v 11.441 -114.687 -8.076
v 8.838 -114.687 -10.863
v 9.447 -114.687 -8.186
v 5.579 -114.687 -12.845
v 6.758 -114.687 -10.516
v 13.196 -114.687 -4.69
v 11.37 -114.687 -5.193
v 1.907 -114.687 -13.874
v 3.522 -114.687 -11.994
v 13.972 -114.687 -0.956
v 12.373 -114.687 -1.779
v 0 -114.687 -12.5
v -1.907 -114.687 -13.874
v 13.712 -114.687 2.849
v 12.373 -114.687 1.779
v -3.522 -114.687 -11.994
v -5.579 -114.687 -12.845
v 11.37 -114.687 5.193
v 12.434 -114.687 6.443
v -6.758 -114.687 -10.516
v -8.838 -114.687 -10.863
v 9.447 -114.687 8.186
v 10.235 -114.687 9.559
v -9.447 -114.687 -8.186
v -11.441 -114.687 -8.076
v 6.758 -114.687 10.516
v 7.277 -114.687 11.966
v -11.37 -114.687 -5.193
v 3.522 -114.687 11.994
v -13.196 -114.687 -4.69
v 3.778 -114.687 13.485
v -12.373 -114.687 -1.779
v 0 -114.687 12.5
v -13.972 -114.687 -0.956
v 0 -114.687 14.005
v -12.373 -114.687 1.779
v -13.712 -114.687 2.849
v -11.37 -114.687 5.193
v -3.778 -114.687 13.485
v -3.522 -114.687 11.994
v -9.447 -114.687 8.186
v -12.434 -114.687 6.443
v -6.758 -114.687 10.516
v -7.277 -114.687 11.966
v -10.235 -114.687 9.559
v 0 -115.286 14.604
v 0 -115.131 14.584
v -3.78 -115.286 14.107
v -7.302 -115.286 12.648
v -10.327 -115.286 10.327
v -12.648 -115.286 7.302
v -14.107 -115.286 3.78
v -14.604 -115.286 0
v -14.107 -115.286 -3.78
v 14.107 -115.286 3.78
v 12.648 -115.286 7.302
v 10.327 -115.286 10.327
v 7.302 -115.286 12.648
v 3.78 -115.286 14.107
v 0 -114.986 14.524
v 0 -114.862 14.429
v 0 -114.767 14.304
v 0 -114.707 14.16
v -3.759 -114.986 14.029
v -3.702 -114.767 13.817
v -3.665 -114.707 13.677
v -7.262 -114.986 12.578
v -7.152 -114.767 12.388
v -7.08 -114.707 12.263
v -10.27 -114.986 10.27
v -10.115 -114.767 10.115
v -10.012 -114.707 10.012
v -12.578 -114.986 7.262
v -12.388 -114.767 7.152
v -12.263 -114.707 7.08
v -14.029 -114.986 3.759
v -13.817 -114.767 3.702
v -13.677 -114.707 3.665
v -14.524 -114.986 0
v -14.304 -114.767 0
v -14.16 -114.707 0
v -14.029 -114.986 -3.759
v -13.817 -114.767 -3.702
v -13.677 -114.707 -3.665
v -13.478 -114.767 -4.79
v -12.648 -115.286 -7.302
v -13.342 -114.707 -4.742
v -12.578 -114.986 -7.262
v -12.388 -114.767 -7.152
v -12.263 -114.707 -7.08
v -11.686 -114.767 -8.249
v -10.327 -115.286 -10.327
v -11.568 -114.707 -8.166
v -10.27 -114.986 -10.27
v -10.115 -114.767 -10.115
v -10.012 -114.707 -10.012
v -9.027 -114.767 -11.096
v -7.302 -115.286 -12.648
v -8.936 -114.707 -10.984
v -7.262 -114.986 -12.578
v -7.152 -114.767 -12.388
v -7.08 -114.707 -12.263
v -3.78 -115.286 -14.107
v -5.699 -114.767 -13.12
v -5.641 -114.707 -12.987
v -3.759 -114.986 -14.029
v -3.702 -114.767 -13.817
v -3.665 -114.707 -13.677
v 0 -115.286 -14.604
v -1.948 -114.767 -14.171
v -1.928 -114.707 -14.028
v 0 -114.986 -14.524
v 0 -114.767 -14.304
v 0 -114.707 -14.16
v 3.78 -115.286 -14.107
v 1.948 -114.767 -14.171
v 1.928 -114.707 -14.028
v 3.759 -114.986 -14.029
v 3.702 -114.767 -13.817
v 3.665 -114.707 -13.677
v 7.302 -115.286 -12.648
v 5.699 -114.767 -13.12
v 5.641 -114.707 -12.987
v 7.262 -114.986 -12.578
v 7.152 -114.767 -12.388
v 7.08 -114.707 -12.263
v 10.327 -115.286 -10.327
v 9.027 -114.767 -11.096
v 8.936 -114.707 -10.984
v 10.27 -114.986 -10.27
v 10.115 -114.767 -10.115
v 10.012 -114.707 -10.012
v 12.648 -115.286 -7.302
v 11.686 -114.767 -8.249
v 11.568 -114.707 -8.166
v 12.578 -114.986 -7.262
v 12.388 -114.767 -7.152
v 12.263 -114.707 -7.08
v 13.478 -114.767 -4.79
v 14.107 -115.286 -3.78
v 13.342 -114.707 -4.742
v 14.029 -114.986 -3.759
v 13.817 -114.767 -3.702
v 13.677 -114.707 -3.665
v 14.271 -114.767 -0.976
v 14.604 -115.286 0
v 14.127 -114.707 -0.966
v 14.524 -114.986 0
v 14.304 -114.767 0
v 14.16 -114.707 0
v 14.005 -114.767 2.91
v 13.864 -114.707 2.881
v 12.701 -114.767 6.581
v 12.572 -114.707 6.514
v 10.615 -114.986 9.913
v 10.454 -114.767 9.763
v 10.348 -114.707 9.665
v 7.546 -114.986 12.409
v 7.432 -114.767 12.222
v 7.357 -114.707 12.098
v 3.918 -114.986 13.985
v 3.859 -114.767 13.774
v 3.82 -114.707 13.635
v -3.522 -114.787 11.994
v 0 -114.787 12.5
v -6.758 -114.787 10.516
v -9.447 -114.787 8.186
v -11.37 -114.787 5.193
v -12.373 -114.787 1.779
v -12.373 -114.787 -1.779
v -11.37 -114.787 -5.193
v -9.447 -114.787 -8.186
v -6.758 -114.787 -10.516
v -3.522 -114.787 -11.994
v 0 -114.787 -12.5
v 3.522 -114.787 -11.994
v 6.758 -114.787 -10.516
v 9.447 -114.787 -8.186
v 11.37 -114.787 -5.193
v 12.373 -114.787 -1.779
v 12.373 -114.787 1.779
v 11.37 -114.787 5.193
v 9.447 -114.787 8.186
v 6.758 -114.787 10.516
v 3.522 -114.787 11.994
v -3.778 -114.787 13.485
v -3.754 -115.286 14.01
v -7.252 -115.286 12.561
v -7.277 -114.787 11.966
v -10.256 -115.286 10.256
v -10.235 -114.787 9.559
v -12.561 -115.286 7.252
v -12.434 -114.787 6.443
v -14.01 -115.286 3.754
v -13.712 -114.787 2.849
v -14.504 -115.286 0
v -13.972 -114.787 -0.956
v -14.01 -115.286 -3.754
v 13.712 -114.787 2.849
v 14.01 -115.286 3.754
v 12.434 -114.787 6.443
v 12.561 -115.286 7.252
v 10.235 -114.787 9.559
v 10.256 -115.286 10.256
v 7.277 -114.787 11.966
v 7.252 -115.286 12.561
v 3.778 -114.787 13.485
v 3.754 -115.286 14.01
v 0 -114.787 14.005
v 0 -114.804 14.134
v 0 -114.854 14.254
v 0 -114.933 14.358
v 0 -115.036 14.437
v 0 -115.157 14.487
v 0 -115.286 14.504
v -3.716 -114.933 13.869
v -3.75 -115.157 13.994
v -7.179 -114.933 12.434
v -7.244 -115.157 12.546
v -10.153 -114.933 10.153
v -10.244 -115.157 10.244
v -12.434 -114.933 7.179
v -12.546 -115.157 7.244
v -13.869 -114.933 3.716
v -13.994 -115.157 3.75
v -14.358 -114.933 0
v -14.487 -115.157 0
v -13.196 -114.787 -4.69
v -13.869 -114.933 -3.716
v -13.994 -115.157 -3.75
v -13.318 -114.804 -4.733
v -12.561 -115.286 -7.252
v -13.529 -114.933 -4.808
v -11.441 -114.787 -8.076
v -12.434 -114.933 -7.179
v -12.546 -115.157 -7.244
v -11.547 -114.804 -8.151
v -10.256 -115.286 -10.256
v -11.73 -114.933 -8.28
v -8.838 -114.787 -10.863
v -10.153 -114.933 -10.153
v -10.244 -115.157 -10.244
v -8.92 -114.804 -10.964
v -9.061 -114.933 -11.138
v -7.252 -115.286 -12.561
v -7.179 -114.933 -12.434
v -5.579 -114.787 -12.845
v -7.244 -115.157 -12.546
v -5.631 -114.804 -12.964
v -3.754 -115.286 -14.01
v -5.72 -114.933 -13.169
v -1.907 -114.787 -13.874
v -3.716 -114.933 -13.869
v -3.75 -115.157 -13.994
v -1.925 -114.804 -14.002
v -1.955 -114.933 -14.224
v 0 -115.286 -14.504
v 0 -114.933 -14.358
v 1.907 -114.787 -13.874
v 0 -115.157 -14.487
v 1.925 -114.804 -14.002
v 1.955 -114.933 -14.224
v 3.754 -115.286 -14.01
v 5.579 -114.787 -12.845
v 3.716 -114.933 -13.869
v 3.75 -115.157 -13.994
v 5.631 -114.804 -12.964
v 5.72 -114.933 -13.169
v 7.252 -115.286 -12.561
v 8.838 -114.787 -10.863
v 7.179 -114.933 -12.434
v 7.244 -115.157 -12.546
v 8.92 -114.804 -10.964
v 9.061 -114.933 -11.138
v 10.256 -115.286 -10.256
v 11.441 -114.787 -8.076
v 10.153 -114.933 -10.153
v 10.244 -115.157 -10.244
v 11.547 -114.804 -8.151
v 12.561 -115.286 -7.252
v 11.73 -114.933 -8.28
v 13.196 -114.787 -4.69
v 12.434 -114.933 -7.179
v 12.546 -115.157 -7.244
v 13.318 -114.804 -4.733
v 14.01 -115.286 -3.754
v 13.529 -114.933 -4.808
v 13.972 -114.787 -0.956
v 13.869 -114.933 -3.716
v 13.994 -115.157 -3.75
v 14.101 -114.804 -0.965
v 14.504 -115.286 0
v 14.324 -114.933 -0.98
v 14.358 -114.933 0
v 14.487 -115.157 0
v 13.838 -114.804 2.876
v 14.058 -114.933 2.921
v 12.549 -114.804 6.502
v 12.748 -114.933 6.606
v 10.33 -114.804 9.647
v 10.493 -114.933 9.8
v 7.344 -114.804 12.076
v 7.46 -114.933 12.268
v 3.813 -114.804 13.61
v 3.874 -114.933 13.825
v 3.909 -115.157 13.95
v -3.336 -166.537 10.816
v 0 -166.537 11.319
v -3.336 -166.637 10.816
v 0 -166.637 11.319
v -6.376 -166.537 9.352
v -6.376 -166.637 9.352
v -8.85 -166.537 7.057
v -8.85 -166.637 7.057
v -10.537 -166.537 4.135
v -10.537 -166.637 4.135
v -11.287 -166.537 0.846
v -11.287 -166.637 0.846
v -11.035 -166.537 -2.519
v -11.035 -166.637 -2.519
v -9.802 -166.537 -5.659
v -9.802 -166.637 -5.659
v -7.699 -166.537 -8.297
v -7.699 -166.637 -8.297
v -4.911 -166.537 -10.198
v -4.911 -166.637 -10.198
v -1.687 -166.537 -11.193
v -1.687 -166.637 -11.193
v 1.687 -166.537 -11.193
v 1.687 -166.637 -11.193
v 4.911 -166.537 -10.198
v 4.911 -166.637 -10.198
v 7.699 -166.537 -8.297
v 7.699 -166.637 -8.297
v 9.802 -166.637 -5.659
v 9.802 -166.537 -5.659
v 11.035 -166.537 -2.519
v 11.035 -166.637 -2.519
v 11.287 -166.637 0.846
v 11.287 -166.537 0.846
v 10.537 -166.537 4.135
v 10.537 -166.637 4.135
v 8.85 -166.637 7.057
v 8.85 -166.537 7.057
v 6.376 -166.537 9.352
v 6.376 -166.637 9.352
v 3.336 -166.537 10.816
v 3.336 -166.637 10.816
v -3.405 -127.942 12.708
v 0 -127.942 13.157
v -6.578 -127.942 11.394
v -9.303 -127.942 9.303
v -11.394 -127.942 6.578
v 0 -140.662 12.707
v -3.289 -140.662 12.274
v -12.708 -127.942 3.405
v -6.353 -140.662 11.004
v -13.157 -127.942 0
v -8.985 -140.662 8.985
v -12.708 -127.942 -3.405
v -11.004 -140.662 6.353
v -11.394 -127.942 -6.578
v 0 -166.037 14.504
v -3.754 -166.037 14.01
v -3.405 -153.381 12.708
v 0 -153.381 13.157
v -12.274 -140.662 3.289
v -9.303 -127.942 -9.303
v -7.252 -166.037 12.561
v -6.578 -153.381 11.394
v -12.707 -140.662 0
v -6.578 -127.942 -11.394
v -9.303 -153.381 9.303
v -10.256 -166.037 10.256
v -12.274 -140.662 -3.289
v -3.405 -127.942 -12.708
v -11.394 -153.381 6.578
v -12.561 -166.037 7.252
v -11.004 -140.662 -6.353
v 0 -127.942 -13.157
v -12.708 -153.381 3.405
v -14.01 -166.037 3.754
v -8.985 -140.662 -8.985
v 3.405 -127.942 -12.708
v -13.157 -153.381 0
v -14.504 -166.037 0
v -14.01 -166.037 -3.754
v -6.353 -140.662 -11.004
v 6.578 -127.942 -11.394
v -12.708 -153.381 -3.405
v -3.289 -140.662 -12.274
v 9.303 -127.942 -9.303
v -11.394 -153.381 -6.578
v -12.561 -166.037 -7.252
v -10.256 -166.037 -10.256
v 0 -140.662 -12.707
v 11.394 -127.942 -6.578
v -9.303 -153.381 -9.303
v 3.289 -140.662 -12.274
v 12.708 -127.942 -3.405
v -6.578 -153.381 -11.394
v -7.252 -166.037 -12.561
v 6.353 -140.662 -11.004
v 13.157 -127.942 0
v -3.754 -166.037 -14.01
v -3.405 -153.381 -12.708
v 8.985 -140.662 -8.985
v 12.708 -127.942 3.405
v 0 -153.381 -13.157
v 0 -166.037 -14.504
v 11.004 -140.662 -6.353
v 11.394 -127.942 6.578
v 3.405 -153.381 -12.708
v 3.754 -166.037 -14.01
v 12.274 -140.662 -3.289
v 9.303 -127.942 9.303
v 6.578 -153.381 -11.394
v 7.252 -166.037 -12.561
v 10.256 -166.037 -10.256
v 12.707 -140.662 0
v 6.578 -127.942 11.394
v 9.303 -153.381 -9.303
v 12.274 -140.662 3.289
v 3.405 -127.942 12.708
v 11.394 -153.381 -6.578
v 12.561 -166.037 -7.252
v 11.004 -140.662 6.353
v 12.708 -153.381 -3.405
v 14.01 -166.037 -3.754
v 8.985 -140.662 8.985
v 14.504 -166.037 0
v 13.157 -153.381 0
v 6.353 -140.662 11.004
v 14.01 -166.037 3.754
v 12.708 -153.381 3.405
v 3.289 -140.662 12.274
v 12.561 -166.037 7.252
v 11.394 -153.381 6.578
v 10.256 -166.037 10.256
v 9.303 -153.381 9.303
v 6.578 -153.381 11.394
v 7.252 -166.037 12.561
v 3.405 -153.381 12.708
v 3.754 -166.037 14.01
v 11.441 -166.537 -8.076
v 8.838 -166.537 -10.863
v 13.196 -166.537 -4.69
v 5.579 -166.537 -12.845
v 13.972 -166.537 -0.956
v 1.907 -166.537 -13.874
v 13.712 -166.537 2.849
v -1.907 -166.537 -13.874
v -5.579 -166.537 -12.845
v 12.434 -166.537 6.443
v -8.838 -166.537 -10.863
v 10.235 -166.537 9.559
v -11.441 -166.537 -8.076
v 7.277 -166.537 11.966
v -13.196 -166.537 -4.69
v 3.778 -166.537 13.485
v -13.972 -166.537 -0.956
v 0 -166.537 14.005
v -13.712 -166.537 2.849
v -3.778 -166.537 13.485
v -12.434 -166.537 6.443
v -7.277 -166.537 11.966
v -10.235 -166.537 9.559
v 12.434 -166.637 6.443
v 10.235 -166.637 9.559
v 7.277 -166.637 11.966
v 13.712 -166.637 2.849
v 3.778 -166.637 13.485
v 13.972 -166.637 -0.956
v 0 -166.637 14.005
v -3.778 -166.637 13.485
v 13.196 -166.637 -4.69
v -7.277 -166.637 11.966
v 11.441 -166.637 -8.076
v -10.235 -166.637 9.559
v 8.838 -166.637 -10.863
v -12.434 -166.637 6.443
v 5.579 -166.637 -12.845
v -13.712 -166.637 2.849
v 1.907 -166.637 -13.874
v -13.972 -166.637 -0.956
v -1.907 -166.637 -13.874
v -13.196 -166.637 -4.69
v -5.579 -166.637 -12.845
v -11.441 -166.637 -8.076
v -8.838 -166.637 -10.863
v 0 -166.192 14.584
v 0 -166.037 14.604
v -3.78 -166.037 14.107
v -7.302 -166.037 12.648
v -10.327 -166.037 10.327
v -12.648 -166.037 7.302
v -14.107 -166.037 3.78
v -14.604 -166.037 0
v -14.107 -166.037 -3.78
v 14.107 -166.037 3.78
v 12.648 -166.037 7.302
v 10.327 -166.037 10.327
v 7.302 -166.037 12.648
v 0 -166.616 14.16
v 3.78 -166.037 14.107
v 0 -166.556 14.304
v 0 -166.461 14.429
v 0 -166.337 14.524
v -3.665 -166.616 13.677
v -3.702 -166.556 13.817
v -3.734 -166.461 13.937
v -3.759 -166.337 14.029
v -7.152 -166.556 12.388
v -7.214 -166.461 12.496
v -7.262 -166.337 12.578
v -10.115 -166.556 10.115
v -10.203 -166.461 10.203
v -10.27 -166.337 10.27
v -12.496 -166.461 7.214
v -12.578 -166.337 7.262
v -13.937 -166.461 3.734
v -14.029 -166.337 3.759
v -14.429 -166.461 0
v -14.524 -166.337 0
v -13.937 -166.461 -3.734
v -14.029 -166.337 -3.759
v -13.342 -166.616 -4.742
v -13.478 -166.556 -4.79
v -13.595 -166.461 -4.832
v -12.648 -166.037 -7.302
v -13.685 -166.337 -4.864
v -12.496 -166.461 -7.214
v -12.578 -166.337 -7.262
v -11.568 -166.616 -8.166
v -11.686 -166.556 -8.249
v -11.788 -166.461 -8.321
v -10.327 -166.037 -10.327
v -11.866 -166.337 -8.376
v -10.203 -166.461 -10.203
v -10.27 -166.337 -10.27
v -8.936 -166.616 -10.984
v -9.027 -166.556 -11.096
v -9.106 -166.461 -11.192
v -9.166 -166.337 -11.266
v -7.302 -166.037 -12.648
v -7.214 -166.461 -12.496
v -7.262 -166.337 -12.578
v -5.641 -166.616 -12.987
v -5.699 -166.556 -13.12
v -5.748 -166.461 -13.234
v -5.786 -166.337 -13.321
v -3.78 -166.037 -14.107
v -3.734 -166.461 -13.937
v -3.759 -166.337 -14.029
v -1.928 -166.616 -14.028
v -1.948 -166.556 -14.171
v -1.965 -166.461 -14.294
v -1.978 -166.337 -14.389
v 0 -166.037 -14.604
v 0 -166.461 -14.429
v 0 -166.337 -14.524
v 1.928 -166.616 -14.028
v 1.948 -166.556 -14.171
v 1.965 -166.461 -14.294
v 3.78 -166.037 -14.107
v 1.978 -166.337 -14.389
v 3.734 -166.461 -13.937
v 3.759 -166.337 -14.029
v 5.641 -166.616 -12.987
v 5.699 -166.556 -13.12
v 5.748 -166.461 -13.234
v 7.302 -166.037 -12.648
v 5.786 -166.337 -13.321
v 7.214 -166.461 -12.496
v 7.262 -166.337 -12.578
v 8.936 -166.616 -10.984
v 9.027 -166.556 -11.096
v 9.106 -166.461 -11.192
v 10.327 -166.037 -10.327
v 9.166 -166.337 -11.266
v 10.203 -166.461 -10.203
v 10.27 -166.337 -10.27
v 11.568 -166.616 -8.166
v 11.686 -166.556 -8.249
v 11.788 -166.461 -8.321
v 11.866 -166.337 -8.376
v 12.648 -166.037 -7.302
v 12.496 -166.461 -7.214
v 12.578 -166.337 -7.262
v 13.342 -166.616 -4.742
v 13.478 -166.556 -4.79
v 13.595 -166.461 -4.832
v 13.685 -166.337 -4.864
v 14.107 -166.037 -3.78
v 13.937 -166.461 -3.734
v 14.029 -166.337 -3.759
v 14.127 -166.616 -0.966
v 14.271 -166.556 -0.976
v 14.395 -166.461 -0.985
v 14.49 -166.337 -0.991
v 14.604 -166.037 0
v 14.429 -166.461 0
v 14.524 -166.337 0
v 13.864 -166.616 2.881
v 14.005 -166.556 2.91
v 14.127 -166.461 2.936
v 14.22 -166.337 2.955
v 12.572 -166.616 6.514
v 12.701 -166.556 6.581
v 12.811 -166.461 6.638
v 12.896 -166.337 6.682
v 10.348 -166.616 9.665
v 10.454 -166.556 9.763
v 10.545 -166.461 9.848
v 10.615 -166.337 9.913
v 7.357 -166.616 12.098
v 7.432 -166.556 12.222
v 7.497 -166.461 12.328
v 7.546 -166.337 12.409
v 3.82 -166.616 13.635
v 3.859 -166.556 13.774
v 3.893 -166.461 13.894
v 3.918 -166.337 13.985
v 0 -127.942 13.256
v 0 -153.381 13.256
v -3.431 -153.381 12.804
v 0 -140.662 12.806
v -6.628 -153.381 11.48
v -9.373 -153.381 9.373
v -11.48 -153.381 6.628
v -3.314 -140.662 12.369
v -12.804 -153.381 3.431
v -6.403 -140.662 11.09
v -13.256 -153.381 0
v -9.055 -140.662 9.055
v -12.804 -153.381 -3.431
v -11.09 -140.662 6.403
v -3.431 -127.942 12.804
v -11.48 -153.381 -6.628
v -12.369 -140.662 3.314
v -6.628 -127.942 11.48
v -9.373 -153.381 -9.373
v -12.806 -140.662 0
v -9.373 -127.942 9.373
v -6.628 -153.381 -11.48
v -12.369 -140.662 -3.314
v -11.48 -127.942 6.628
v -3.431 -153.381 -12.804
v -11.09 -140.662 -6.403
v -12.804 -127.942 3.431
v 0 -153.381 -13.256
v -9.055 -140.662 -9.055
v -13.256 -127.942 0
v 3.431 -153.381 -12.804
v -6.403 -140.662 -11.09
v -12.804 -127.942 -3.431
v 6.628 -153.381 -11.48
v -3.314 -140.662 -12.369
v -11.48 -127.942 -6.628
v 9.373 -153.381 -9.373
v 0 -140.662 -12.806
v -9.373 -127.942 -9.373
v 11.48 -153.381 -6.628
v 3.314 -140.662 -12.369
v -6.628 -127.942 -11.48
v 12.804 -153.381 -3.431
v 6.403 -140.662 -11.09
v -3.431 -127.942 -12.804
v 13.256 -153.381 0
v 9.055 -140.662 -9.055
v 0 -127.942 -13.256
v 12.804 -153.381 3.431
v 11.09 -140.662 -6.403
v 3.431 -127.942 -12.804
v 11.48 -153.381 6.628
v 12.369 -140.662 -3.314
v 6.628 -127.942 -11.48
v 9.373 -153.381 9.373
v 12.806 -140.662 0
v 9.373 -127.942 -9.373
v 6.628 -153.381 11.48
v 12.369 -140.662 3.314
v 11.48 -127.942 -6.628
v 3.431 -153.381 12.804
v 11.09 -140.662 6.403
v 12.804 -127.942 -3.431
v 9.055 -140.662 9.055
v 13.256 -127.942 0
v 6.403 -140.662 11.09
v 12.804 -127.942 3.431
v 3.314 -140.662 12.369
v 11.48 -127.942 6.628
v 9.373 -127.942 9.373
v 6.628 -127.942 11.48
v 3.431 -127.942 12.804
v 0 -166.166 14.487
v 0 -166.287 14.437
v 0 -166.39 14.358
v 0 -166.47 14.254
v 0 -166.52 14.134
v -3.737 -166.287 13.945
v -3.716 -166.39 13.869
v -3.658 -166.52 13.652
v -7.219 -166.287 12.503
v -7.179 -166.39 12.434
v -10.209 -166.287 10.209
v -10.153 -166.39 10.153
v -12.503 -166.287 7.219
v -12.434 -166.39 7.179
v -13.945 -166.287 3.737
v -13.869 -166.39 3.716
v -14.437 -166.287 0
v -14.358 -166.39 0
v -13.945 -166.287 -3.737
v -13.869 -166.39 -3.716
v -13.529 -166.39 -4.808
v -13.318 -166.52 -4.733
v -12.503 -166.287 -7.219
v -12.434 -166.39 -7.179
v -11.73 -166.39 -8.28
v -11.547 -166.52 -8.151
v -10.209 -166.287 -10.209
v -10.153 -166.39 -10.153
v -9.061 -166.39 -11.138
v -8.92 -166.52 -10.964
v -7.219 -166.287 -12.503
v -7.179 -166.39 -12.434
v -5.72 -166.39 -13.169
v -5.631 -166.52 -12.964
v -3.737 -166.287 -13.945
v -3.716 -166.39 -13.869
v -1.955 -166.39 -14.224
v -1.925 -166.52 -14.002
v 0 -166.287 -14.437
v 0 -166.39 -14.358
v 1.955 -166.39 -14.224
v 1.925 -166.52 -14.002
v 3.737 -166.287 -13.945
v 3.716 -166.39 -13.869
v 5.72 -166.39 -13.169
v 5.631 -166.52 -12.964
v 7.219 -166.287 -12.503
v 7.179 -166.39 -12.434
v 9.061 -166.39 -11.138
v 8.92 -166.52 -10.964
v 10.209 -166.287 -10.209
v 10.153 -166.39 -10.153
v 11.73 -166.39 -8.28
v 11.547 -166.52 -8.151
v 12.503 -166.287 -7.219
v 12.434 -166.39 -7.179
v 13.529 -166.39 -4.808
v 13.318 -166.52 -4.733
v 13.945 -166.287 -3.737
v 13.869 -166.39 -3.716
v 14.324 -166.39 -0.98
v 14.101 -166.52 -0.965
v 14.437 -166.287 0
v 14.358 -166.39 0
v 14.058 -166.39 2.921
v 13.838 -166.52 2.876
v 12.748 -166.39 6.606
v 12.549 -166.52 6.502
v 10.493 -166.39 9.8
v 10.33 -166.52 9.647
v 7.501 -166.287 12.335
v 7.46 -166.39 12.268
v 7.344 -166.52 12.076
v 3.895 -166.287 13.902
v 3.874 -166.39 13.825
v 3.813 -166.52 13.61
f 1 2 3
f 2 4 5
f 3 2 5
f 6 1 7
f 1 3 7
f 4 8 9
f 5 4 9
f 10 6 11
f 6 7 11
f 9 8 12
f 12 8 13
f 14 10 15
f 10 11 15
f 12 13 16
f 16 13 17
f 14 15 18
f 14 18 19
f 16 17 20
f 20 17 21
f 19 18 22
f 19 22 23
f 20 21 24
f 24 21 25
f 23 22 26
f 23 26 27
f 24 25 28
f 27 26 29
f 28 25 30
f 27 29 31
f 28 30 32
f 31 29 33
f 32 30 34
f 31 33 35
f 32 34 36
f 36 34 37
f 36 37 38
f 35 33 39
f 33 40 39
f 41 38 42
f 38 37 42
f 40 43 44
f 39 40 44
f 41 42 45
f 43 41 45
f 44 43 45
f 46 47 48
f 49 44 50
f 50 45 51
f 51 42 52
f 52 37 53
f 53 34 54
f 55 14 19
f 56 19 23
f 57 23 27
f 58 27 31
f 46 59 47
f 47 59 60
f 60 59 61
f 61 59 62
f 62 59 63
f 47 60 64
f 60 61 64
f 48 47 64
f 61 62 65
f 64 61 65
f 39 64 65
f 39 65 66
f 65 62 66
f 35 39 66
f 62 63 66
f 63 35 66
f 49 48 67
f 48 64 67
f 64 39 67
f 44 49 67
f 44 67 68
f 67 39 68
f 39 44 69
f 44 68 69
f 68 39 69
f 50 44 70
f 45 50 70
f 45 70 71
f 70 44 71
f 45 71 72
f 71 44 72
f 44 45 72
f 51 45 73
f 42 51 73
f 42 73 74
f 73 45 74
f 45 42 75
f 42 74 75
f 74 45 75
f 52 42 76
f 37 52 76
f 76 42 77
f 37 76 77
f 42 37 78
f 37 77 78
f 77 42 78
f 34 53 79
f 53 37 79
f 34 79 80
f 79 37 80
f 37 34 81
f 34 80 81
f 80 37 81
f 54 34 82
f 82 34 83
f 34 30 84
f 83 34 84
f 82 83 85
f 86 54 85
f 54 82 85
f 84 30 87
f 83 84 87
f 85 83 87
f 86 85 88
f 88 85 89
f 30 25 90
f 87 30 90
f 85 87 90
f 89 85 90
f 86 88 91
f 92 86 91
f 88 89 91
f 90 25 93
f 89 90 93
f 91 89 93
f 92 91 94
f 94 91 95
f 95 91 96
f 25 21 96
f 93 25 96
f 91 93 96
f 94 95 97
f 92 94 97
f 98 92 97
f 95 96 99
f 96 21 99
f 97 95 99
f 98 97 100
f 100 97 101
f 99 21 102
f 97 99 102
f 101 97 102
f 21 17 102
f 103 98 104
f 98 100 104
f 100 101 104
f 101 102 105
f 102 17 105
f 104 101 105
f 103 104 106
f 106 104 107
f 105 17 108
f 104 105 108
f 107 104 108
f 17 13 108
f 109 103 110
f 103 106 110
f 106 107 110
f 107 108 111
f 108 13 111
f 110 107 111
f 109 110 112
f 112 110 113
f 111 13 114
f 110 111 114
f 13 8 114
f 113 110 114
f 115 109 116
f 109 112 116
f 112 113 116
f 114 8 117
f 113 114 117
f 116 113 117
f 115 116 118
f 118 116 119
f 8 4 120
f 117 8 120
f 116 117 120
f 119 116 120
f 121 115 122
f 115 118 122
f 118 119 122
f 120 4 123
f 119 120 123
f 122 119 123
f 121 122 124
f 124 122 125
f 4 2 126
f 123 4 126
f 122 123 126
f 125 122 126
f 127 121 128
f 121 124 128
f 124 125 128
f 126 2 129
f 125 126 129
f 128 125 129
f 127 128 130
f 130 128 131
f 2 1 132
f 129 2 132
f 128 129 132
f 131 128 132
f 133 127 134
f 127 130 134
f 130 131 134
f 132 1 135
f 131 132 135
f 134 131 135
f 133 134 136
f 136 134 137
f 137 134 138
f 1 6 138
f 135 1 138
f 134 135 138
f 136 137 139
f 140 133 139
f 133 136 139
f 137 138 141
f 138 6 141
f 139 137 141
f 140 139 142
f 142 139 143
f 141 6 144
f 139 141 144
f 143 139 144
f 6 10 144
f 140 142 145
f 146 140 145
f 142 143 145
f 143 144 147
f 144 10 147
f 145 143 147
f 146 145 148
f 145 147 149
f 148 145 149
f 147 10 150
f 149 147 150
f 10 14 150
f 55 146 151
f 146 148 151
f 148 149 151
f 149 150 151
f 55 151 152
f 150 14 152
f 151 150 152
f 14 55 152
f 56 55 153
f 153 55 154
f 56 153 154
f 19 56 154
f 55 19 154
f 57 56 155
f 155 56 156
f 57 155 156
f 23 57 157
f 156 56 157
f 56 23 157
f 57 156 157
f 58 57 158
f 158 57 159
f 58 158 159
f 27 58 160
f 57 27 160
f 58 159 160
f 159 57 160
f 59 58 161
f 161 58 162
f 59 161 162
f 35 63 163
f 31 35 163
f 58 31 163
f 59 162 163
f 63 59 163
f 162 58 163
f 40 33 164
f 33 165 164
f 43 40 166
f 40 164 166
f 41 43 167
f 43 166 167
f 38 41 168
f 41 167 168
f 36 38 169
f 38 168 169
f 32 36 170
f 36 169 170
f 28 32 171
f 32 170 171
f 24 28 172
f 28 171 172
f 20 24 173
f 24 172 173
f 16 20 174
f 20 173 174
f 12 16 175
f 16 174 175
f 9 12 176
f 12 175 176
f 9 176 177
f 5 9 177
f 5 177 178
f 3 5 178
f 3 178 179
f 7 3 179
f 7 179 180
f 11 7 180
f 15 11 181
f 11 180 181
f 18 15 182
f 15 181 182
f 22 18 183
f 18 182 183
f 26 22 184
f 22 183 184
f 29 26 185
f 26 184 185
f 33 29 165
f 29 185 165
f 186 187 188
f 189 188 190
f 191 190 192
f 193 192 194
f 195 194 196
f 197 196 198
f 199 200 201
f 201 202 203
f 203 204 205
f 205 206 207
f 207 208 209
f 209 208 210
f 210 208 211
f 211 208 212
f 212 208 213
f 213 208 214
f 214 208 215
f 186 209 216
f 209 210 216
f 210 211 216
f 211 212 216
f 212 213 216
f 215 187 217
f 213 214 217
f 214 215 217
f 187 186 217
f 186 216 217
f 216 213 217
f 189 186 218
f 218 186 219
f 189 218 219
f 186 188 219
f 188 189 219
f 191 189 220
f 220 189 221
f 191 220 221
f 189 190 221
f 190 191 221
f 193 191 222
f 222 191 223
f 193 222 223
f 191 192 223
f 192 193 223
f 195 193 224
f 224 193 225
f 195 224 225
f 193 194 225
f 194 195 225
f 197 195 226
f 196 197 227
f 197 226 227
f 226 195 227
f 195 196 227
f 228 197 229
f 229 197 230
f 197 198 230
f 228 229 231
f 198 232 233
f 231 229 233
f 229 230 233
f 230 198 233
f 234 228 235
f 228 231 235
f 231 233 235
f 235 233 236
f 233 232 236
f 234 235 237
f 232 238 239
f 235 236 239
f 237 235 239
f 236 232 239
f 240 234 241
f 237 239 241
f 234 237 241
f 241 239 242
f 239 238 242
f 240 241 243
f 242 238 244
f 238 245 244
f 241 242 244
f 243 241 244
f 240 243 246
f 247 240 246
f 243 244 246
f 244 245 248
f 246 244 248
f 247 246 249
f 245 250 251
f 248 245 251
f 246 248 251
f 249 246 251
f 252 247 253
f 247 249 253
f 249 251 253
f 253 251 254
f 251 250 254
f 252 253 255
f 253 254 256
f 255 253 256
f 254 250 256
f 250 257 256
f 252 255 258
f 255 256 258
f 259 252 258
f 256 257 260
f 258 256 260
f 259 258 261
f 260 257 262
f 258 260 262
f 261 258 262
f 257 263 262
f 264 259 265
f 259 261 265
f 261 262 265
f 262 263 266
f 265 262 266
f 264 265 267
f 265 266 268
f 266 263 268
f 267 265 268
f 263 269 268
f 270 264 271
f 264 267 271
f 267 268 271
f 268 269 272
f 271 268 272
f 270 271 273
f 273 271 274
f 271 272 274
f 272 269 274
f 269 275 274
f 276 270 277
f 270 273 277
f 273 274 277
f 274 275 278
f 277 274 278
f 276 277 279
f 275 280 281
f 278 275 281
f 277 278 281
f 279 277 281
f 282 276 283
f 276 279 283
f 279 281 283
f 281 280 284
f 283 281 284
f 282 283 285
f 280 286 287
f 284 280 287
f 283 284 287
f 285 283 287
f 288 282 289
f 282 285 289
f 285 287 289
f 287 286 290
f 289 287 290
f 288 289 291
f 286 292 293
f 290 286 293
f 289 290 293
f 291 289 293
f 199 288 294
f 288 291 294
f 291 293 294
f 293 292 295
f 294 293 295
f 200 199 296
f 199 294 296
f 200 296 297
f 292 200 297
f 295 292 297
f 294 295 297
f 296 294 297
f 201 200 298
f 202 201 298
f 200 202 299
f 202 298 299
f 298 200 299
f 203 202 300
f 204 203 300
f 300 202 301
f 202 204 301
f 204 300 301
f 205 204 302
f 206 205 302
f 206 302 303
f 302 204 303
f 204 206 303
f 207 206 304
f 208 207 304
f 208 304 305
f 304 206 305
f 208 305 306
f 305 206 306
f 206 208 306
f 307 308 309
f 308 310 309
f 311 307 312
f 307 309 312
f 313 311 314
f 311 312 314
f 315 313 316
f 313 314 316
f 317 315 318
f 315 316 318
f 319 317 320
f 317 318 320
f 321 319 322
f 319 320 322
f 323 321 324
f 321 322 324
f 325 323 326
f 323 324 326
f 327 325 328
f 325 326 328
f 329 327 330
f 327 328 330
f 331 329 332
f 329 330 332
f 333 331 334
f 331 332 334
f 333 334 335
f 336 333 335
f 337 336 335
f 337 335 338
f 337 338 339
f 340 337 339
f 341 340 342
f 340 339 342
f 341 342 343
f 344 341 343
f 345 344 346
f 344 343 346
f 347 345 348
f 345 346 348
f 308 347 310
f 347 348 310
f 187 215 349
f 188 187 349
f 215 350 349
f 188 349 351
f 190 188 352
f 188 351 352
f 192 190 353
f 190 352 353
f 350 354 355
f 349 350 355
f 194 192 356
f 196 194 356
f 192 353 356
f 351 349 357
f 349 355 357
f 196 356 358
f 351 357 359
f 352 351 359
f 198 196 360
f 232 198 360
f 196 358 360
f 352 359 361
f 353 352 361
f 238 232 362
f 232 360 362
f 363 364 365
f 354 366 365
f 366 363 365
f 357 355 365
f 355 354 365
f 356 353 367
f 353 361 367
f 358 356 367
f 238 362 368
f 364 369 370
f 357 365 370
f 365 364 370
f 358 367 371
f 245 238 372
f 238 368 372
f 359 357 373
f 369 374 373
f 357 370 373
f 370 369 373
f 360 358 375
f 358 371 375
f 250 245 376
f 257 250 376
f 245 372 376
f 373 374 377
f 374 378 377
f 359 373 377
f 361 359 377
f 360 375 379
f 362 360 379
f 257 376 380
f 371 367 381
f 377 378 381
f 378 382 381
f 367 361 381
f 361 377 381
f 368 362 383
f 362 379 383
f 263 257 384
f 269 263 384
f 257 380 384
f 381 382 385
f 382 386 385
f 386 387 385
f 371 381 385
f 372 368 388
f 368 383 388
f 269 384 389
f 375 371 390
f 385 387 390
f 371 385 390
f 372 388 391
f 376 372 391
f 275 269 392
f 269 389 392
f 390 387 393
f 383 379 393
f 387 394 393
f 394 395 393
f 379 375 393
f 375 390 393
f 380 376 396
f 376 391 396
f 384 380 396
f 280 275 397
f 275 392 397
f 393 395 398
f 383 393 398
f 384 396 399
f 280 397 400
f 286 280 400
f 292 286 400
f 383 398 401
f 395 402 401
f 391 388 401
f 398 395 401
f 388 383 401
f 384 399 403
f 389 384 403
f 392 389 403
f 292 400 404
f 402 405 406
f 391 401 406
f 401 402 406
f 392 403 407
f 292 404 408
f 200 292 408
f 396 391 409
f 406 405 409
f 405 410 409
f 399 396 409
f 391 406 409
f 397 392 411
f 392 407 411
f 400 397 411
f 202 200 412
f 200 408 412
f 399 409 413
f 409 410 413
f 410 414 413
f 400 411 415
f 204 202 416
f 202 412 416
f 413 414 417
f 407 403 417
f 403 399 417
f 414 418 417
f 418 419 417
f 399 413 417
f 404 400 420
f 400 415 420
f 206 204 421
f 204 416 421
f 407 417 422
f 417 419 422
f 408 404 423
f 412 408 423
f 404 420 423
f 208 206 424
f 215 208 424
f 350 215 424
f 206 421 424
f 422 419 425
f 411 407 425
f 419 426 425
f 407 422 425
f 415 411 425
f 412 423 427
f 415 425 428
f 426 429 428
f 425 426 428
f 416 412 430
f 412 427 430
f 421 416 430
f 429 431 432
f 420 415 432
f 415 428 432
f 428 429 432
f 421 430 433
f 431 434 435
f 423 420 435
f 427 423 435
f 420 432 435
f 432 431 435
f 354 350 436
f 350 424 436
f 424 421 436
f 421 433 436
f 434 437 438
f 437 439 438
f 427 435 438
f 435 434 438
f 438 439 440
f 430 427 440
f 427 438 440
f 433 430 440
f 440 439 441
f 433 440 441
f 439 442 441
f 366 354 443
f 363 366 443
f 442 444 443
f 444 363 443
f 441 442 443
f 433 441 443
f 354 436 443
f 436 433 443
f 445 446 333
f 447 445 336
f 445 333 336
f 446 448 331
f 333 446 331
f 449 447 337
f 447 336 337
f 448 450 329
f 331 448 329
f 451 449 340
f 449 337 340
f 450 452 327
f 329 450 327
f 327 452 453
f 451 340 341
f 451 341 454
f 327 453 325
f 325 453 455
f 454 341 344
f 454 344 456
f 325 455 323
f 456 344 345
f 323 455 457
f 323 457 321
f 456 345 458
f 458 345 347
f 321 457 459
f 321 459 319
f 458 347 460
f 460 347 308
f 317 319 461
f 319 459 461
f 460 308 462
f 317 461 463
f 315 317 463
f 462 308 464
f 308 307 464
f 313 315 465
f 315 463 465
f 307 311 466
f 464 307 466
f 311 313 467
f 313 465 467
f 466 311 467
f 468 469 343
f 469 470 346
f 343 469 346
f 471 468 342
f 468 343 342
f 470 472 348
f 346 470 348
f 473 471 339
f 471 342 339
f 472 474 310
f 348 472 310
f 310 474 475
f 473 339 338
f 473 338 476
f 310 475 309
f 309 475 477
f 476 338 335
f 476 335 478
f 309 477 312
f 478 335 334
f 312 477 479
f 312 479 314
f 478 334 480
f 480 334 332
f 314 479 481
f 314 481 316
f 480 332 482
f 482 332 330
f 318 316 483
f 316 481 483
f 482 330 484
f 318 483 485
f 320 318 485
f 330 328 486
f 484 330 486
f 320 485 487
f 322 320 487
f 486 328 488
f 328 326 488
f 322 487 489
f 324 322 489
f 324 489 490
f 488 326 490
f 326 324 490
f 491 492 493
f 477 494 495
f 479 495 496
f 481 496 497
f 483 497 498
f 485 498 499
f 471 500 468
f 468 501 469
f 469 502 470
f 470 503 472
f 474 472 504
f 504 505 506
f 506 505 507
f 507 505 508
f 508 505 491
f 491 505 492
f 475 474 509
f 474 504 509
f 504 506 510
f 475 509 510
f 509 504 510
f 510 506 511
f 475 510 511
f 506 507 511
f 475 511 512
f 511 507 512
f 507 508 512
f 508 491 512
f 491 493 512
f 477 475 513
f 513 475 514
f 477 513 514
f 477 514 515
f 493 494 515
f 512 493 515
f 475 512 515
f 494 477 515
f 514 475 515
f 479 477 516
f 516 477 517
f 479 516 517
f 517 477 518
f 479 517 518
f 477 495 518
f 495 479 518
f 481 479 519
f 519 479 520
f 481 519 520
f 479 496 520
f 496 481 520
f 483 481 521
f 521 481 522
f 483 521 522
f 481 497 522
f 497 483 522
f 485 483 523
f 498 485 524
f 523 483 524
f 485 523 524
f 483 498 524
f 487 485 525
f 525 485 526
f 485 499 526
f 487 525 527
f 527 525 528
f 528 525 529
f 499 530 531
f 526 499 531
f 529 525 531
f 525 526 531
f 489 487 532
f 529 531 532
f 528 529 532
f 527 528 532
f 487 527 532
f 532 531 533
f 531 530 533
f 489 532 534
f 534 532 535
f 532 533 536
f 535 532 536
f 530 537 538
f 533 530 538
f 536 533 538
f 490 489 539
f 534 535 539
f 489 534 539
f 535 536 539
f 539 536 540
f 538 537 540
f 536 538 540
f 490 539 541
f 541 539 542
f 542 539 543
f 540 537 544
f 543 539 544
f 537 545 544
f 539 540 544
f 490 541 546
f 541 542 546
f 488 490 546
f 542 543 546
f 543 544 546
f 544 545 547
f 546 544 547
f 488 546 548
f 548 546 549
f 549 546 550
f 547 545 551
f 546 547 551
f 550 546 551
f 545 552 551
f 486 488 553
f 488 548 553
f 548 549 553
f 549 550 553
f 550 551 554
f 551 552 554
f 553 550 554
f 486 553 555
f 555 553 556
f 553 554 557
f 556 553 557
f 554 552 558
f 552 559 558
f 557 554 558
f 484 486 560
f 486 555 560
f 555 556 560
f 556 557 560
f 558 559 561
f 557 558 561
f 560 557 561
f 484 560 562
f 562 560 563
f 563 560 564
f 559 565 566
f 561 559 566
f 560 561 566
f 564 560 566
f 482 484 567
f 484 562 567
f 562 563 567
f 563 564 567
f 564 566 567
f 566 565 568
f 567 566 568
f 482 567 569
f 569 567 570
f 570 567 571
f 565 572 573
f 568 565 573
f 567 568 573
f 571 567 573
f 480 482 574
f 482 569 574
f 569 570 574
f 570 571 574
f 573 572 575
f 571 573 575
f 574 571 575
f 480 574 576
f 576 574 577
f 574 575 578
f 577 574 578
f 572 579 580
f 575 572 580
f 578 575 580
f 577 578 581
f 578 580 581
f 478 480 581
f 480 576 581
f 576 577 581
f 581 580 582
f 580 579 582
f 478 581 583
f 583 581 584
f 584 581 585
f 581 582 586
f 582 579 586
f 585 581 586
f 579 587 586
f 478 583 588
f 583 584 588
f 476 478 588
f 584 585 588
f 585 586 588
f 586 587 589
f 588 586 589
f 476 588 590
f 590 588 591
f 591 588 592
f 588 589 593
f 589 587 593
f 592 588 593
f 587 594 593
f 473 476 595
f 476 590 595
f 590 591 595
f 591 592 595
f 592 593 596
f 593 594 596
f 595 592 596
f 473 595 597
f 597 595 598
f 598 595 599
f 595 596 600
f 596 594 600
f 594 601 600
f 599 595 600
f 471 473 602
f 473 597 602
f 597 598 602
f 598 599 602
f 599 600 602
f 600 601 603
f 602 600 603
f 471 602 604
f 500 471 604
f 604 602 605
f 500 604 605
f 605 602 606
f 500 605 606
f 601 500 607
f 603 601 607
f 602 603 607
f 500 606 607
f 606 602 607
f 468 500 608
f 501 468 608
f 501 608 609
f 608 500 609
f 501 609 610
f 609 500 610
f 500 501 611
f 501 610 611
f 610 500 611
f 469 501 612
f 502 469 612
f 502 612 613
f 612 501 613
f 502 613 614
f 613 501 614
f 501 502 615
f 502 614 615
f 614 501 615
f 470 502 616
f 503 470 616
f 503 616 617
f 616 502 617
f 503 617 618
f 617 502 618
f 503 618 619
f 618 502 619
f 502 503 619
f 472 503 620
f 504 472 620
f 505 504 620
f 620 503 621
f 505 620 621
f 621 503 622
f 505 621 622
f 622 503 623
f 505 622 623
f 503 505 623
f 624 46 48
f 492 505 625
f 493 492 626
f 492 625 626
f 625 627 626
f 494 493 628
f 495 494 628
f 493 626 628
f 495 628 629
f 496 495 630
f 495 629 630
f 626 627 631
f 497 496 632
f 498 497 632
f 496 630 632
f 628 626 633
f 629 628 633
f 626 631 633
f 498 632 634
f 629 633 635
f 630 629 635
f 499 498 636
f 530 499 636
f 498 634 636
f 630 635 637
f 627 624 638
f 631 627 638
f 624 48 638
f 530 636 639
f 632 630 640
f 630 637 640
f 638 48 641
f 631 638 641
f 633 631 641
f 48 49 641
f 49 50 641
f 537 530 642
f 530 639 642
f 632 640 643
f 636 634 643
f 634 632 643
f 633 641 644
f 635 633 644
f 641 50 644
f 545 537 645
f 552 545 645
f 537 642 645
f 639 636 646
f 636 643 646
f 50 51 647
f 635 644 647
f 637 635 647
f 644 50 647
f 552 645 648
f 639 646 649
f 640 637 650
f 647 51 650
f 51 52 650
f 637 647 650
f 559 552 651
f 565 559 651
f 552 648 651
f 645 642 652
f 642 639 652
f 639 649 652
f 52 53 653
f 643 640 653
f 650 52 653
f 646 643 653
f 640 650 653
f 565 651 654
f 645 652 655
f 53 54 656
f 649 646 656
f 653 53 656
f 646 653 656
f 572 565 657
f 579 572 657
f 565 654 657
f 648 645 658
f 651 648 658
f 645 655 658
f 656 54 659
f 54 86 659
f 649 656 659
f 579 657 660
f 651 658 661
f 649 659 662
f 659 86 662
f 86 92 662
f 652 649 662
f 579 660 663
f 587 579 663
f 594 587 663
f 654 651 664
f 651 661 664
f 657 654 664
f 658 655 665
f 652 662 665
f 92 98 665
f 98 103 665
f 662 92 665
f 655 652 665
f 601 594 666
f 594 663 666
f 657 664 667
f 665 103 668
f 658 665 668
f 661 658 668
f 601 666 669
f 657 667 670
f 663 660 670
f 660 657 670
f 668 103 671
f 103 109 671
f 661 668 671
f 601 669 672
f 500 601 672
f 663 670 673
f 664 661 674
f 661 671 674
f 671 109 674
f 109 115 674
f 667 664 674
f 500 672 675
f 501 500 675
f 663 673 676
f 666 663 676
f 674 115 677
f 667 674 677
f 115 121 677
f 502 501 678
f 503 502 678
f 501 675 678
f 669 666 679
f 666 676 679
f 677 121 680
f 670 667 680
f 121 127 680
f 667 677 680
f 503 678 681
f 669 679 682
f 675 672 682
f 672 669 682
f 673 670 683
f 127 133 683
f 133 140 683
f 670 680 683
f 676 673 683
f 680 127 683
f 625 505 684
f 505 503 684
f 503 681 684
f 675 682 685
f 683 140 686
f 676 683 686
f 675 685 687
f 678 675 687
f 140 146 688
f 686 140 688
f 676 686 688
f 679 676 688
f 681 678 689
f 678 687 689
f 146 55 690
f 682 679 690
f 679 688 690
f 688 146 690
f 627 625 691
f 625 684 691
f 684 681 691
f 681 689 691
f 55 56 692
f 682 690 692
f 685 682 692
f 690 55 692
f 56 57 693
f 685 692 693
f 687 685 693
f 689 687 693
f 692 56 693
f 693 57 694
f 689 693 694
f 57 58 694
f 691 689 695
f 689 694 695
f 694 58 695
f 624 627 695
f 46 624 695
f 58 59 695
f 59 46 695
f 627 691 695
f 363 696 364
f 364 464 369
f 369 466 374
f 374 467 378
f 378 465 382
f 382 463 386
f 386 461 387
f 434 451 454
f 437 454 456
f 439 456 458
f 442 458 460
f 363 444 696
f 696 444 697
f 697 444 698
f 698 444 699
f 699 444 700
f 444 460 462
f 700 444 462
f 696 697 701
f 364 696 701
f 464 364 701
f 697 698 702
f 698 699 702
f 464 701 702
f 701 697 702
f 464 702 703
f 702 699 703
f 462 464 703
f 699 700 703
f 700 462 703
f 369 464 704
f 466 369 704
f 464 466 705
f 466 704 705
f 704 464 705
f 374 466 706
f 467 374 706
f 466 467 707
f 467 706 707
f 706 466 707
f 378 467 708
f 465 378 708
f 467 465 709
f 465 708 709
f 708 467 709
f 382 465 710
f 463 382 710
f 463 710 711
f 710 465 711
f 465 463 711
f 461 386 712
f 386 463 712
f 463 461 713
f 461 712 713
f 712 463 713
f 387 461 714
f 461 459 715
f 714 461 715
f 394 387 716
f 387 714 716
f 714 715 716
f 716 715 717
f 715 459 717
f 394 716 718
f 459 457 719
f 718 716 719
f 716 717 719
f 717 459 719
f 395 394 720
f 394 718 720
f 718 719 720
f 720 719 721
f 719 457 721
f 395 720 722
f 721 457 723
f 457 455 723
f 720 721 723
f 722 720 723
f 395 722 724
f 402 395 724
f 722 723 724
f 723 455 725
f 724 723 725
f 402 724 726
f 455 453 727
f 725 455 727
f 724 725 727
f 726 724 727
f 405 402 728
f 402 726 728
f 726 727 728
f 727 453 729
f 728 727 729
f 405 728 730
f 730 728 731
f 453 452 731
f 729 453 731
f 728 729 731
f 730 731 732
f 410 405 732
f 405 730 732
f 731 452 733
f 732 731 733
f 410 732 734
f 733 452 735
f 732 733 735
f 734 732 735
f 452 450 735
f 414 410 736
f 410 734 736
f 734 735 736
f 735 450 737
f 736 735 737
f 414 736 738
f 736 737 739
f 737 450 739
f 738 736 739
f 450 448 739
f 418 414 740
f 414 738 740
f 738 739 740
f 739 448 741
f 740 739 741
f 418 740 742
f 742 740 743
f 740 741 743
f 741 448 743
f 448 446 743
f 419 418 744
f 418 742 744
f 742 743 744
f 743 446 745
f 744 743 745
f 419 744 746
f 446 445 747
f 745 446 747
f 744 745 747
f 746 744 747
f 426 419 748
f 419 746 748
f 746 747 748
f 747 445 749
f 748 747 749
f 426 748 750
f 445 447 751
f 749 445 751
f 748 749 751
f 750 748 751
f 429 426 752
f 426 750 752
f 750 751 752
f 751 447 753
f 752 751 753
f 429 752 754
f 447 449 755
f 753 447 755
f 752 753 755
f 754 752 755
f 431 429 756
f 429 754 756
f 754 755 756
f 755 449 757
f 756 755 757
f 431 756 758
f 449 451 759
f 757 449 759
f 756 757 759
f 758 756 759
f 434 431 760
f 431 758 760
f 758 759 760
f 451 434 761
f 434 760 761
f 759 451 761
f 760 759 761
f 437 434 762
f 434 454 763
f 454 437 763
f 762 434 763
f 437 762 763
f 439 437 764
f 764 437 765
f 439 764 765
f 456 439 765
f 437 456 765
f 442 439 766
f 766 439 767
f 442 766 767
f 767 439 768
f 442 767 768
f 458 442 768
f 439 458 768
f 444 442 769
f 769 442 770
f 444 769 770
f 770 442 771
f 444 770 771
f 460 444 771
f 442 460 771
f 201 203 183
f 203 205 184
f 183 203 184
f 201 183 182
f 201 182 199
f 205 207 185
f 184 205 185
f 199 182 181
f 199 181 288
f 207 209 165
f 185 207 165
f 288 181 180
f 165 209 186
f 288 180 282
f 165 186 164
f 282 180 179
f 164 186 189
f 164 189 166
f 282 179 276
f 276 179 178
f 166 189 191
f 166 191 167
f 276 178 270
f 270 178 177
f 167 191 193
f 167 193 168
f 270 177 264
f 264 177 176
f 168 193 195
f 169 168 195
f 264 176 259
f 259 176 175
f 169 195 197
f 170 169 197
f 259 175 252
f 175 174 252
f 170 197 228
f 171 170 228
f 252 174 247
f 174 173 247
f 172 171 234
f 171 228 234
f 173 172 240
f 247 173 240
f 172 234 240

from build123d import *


with BuildPart() as part:
    # Sketch1 → Revolve1 (revolve)
    with BuildSketch(Plane.XY, mode=Mode.PRIVATE) as revolve1_sk:
        with BuildLine():
            Line((12.5, -114.686619696), (12.5, -114.786619696))
            Line((12.5, -114.786619696), (14.004531695, -114.786619696))
            ThreePointArc((14.004531695, -114.786619696), (14.357864572, -114.932974966), (14.504219842, -115.286307843))
            ThreePointArc((14.504219842, -115.286307843), (12.706614743, -140.661619696), (14.504219842, -166.036931549))
            ThreePointArc((14.504219842, -166.036931549), (14.357864572, -166.390264426), (14.004531695, -166.536619696))
            Line((14.004531695, -166.536619696), (11.318941473, -166.536619696))
            Line((11.318941473, -166.536619696), (11.318941473, -166.636619696))
            Line((11.318941473, -166.636619696), (14.004531695, -166.636619696))
            ThreePointArc((14.004531695, -166.636619696), (14.42857525, -166.460975104), (14.604219842, -166.036931549))
            ThreePointArc((14.604219842, -166.036931549), (12.805615521, -140.661619696), (14.604219842, -115.286307843))
            ThreePointArc((14.604219842, -115.286307843), (14.42857525, -114.862264288), (14.004531695, -114.686619696))
            Line((14.004531695, -114.686619696), (12.5, -114.686619696))
        make_face()
    revolve(revolve1_sk.sketch.rotate(Axis((0, 0, 0), (0, -1, 0)), 90), axis=Axis((0, 0, 0), (0, -1, 0)))


solid = part.part
